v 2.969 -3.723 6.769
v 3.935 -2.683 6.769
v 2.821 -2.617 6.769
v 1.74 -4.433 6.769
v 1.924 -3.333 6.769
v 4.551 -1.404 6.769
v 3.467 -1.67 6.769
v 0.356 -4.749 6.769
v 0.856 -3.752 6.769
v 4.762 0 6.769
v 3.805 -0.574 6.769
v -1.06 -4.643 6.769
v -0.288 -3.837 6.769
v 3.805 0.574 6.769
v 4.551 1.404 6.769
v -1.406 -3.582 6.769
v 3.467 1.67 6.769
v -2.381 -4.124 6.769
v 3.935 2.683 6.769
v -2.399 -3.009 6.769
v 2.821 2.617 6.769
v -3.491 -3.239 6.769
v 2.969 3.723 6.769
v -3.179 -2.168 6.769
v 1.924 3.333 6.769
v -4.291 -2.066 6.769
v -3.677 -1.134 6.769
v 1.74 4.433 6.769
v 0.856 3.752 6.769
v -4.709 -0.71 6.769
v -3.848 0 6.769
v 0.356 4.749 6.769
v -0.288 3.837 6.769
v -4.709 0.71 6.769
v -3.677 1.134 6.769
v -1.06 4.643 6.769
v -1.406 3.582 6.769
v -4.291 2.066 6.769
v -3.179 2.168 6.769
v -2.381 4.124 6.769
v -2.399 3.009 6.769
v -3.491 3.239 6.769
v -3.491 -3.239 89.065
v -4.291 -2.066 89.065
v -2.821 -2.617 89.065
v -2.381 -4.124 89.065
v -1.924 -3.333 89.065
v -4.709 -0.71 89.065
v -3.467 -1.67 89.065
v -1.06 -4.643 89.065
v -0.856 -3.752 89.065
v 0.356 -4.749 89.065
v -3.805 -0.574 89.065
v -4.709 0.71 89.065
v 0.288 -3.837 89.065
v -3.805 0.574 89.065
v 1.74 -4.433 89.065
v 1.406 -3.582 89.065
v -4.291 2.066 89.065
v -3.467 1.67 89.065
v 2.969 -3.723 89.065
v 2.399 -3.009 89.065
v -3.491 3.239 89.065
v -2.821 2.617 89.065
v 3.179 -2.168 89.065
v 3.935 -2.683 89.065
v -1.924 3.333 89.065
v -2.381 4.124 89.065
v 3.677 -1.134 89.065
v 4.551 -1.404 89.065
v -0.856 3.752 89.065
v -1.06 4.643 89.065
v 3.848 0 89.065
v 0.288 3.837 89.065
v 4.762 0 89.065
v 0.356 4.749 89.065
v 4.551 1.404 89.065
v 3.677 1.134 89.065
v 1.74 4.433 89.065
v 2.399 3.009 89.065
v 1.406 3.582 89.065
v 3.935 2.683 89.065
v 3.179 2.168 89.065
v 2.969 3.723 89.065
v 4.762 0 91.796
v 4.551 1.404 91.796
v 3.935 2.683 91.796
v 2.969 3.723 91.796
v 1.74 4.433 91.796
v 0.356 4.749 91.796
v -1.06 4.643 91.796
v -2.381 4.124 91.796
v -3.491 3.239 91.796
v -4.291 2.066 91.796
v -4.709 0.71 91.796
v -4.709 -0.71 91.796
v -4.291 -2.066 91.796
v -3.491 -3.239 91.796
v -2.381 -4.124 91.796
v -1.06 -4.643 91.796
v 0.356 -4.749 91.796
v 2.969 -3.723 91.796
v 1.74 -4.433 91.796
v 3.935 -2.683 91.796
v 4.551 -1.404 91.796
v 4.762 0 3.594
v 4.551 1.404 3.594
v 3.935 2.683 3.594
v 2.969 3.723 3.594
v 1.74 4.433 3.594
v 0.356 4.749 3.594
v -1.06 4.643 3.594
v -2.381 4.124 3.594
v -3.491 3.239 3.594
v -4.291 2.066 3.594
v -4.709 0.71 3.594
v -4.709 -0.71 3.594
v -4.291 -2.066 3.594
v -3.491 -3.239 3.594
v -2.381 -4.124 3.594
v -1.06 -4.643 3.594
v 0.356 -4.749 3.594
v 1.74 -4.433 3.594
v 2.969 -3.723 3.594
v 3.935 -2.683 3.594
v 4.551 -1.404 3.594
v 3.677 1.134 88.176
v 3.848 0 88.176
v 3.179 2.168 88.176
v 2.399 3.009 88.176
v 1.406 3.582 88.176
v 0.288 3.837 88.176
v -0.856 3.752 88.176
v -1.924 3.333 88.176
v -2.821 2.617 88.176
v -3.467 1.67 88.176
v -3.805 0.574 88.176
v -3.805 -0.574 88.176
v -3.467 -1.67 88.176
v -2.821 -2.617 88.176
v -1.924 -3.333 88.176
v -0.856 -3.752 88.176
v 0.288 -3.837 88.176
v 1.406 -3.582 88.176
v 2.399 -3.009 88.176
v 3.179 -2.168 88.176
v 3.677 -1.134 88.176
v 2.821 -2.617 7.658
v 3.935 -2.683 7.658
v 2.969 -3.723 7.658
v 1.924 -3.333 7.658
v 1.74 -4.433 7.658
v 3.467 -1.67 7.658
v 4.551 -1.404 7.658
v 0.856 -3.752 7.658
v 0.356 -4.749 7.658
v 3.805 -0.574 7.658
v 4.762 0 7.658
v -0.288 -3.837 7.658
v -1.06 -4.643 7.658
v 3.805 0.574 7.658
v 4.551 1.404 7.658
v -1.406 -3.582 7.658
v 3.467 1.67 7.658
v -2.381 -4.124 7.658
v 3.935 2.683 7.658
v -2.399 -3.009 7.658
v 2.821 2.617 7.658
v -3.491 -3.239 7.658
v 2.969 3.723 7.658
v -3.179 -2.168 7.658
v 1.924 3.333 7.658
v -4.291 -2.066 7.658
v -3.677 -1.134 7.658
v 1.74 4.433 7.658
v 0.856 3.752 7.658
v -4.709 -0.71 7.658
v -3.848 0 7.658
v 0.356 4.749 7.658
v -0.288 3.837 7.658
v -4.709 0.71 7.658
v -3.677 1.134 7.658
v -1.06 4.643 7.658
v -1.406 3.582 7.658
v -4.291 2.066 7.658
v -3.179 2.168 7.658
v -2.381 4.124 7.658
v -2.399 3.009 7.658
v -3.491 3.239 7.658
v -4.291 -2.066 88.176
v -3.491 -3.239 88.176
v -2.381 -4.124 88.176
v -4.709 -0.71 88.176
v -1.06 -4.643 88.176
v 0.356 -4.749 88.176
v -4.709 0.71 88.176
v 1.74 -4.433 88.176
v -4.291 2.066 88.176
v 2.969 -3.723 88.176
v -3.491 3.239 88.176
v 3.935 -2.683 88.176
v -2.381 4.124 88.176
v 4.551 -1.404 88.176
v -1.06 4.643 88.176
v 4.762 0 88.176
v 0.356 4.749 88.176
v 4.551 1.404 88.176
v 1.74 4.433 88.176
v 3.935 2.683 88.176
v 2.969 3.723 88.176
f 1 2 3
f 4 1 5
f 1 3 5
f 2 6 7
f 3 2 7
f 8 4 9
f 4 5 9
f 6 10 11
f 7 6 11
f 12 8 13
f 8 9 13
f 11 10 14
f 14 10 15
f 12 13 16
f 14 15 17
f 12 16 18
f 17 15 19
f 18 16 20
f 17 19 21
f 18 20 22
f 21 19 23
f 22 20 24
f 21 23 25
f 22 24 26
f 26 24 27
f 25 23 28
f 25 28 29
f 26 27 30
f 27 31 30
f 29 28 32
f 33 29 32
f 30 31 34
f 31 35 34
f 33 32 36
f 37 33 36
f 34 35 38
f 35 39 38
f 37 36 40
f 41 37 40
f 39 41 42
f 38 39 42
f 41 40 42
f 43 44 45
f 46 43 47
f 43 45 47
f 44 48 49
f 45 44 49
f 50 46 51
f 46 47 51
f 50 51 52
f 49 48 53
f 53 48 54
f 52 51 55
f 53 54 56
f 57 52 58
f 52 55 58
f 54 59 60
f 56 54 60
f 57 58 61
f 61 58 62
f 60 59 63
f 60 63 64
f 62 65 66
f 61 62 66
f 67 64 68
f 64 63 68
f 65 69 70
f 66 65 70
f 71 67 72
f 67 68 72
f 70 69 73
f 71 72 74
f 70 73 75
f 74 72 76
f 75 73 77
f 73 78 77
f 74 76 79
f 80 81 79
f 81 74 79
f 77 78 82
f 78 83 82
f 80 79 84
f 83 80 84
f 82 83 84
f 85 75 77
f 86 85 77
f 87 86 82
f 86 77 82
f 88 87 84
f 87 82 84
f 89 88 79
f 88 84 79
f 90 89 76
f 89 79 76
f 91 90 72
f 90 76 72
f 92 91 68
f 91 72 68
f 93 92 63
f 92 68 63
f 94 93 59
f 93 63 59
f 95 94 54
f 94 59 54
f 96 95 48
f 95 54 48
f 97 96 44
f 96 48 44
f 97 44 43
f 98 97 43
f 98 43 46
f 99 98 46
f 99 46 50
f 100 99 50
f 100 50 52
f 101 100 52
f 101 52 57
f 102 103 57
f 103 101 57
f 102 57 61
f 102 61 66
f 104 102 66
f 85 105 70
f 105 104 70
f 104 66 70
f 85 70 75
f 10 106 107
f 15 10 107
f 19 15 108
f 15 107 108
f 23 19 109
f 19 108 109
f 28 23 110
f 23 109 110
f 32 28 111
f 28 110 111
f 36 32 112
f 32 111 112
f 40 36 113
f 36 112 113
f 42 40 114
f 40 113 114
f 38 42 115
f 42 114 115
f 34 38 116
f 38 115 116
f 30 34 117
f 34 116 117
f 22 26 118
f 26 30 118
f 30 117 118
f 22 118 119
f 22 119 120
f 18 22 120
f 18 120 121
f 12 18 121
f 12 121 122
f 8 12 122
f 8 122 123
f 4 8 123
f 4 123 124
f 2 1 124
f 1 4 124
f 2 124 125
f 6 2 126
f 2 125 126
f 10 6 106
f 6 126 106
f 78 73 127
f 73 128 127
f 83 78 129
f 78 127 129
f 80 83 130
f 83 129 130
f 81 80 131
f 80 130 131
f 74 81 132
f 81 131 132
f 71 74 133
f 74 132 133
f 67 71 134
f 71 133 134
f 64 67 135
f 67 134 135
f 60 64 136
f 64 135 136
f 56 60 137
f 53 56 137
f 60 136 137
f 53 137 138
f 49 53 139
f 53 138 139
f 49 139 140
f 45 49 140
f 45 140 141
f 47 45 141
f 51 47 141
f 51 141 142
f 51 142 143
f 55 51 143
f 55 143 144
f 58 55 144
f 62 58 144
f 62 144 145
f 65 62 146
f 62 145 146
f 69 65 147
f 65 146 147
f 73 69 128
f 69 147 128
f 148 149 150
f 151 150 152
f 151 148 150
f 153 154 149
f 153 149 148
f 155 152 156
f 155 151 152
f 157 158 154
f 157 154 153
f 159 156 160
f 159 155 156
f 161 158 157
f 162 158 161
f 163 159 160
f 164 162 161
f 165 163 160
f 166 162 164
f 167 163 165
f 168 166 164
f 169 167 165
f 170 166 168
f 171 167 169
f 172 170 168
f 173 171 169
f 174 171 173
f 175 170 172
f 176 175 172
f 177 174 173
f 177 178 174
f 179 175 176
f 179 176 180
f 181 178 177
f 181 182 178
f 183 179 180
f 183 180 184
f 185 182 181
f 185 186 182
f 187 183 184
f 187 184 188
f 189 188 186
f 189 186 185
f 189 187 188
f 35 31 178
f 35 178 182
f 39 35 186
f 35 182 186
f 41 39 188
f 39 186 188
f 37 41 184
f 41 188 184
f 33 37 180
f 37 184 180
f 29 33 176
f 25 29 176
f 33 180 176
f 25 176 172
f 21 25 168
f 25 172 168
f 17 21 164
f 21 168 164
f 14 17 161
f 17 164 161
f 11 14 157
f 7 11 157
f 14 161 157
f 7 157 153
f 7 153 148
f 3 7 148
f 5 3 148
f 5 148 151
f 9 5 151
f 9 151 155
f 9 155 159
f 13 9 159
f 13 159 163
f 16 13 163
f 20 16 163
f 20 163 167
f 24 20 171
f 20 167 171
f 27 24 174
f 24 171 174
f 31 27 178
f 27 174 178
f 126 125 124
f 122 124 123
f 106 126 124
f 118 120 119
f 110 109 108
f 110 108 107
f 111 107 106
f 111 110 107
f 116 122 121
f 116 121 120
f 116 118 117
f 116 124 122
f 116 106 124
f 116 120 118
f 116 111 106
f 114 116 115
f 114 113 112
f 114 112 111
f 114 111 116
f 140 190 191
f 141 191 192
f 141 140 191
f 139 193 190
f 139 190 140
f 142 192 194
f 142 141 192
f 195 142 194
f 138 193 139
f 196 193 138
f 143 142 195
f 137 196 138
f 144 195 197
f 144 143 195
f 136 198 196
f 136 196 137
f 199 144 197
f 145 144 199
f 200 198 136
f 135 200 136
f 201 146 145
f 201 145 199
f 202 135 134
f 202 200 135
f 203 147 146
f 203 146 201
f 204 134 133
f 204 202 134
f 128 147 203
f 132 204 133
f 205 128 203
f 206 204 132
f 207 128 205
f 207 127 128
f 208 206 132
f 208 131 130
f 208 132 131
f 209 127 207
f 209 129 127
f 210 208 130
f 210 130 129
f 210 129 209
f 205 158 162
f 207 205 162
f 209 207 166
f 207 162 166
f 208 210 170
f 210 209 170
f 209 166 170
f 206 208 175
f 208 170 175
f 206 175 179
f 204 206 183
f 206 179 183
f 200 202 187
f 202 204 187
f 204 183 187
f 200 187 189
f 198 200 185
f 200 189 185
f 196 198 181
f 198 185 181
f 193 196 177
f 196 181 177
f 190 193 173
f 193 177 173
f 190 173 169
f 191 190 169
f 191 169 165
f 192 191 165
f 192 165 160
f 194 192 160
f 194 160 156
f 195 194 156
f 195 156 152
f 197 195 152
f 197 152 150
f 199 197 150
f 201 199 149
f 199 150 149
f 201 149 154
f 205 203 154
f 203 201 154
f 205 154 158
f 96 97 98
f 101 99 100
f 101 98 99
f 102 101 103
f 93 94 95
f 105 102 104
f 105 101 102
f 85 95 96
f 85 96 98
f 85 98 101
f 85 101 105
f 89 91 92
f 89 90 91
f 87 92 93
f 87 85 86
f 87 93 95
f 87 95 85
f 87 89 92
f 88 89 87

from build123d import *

# Parameters (mm, degrees)
SKETCH1_R           = 4.7625
BOSS_EXTRUDE1_DEPTH = 97.3074
SKETCH3_R           = 9.078890277
SKETCH3_R_2         = 3.8481
CUT_EXTRUDE1_DEPTH  = 0.4445
SKETCH4_R           = 7.766517843
SKETCH4_R_2         = 3.8481
CUT_EXTRUDE2_DEPTH  = 0.4445
SKETCH5_R           = 6.35
CUT_EXTRUDE3_DEPTH  = 5.5118
SKETCH6_R           = 6.35
CUT_EXTRUDE4_DEPTH  = 3.5941


with BuildPart() as part:
    # Sketch1 → Boss-Extrude1 (new body)
    with BuildSketch(Plane.XY):
        Circle(SKETCH1_R)
    extrude(amount=BOSS_EXTRUDE1_DEPTH)

    # Sketch3 → Cut-Extrude1 (cut, symmetric)
    with BuildSketch(Plane(origin=(0, 0, 7.2136), x_dir=(-1, 0, 0), z_dir=(0, 0, -1))):
        Circle(SKETCH3_R)
        Circle(SKETCH3_R_2, mode=Mode.SUBTRACT)
    extrude(amount=CUT_EXTRUDE1_DEPTH, both=True, mode=Mode.SUBTRACT)

    # Sketch4 → Cut-Extrude2 (cut, symmetric)
    with BuildSketch(Plane.XY.offset(88.6206)):
        Circle(SKETCH4_R)
        Circle(SKETCH4_R_2, mode=Mode.SUBTRACT)
    extrude(amount=CUT_EXTRUDE2_DEPTH, both=True, mode=Mode.SUBTRACT)

    # Sketch5 → Cut-Extrude3 (cut)
    with BuildSketch(Plane.XY.offset(97.3074)):
        Circle(SKETCH5_R)
    extrude(amount=-CUT_EXTRUDE3_DEPTH, mode=Mode.SUBTRACT)

    # Sketch6 → Cut-Extrude4 (cut)
    with BuildSketch(Plane(origin=(0, 0, 0), x_dir=(-1, 0, 0), z_dir=(0, 0, -1))):
        Circle(SKETCH6_R)
    extrude(amount=-CUT_EXTRUDE4_DEPTH, mode=Mode.SUBTRACT)


solid = part.part
